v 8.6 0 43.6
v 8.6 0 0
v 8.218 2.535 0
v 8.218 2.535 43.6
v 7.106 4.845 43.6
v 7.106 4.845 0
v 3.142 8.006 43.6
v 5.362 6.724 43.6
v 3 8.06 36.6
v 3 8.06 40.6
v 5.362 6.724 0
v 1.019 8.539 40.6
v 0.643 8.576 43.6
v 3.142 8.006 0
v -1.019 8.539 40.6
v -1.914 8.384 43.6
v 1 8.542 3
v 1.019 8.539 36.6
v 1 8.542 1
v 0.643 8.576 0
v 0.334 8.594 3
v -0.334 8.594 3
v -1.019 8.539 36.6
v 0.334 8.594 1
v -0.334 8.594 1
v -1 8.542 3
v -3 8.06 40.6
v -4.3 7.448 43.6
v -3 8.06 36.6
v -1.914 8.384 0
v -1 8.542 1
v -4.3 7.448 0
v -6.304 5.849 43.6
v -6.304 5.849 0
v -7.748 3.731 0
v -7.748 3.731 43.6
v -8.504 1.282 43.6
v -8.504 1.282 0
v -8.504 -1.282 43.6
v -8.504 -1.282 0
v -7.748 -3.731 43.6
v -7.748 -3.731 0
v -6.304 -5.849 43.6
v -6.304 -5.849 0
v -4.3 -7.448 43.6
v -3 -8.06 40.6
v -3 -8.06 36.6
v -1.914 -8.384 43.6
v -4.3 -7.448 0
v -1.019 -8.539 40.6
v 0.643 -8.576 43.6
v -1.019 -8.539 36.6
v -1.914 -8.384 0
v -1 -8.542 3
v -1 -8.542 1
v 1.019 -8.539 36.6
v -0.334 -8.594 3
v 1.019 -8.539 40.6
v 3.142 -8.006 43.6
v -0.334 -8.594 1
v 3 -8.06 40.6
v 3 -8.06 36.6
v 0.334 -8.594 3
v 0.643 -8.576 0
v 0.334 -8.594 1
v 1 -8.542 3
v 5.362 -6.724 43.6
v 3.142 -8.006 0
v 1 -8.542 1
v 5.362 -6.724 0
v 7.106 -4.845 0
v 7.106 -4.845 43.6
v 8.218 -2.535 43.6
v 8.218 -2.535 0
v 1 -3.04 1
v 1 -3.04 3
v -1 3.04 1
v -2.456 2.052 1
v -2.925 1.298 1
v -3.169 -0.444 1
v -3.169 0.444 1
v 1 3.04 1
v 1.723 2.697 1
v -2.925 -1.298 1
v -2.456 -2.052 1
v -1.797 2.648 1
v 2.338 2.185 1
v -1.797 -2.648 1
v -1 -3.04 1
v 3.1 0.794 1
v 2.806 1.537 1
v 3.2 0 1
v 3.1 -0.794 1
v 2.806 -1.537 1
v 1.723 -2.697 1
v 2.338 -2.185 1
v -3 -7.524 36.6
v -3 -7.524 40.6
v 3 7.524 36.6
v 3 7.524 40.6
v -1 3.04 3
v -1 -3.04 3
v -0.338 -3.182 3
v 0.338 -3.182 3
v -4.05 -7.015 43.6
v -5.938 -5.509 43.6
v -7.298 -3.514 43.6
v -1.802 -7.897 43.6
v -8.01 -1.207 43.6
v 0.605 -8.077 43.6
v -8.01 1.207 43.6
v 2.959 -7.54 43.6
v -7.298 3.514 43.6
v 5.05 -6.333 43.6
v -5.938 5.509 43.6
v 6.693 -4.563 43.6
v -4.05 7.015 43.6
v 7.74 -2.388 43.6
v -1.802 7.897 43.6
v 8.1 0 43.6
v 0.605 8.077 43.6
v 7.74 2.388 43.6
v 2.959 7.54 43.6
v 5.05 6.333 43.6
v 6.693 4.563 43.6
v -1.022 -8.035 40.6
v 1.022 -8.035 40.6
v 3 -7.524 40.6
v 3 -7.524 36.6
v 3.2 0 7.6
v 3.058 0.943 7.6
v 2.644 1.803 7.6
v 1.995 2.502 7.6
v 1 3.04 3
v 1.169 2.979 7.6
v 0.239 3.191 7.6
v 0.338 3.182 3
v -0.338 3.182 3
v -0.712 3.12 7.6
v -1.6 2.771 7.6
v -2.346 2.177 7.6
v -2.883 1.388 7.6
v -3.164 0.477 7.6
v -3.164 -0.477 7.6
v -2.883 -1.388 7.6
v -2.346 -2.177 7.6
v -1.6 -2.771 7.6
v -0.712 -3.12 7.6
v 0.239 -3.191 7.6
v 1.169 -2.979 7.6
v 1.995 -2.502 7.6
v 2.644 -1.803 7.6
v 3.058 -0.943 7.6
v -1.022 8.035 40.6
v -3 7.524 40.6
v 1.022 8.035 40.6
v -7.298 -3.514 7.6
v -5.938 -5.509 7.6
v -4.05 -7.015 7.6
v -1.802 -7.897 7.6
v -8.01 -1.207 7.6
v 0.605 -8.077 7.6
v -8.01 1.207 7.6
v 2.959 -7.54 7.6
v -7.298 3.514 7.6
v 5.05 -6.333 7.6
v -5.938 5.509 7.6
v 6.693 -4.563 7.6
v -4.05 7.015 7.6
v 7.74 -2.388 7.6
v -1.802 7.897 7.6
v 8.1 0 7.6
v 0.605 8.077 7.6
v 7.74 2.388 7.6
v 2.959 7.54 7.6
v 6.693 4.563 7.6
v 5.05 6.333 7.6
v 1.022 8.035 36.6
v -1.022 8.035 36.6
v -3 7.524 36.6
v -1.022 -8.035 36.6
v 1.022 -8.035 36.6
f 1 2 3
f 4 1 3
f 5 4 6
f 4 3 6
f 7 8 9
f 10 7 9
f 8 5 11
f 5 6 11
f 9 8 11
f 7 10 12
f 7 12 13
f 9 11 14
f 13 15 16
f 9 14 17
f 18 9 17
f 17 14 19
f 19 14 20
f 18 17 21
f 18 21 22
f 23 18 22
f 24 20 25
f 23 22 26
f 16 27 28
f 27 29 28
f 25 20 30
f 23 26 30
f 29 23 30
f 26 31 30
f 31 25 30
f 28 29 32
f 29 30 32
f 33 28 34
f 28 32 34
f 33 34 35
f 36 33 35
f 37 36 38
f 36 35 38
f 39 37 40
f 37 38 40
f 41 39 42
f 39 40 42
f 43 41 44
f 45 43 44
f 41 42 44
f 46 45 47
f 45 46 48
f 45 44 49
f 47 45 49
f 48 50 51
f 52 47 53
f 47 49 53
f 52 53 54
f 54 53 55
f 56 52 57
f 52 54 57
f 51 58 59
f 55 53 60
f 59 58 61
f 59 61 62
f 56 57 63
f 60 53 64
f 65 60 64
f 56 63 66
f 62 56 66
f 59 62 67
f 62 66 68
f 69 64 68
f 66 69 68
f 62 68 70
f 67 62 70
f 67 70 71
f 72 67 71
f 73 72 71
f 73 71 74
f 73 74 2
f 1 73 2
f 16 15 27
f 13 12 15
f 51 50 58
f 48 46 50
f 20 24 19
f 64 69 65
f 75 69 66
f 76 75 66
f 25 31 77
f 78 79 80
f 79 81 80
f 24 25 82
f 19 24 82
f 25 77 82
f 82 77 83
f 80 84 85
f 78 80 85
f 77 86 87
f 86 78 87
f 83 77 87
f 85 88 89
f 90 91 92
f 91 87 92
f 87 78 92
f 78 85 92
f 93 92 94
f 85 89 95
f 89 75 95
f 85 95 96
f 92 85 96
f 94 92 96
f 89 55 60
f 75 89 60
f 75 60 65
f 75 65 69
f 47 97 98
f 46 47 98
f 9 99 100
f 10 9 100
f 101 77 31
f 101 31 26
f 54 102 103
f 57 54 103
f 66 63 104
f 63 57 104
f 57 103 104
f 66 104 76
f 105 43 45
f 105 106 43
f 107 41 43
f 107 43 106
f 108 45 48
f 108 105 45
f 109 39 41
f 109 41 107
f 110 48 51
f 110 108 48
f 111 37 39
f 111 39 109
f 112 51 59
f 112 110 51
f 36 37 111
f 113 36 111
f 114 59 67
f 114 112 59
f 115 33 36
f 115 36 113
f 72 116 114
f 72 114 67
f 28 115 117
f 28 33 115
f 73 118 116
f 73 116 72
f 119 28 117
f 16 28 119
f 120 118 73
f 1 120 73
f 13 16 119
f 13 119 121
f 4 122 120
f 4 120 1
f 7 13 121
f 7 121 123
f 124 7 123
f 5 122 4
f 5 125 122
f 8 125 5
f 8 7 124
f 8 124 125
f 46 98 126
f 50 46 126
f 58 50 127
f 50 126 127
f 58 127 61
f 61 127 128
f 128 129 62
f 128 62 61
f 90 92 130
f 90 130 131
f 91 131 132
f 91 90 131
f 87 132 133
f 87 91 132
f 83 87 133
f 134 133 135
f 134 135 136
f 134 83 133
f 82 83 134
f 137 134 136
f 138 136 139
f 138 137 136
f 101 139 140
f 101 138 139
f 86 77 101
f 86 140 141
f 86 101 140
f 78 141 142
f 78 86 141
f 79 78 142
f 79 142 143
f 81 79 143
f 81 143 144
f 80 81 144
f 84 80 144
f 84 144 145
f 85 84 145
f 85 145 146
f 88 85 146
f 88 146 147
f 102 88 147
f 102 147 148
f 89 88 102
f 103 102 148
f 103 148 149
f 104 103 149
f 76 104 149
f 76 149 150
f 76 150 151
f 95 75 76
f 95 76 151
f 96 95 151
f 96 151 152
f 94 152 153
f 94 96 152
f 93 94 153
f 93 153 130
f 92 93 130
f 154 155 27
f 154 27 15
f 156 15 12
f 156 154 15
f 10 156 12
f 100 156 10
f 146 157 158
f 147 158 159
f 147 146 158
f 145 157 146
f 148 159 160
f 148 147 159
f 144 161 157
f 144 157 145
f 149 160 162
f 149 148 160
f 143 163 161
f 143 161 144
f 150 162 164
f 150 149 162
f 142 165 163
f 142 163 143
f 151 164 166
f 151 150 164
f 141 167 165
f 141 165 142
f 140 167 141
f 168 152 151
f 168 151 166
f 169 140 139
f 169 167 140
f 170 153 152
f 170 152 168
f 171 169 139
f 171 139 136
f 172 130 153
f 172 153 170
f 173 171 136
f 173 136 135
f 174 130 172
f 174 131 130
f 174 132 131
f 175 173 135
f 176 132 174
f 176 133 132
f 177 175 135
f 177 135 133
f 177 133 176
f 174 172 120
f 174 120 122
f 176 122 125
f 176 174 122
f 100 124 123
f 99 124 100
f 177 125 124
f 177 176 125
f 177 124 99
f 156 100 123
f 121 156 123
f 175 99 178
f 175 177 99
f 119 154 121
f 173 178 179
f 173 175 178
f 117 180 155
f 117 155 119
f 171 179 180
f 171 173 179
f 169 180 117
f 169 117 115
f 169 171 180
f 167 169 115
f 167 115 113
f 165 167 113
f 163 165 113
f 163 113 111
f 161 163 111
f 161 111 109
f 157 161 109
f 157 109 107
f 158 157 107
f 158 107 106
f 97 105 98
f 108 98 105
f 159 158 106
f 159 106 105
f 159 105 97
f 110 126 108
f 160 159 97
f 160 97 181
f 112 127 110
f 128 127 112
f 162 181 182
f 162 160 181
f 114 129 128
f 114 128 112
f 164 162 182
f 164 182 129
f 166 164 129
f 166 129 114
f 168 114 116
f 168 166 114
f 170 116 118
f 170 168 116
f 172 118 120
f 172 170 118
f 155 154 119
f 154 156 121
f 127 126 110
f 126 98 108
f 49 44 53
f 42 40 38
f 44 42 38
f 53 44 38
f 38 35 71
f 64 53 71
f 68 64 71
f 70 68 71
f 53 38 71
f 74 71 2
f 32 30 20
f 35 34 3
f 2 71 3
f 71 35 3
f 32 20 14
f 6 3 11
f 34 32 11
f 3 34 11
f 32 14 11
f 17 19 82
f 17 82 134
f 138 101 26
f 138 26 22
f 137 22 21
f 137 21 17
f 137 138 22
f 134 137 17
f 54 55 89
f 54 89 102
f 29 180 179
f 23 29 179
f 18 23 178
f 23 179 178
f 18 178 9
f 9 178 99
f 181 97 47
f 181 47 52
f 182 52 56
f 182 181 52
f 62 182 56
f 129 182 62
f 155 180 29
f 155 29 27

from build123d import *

# Parameters (mm, degrees)
SKETCH_R             = 8.6
PAD_DEPTH            = 1
SKETCH001_R          = 8.6
SKETCH001_R_2        = 3.2
PAD001_DEPTH         = 6.6
SKETCH002_W          = 2
SKETCH002_H          = 2
POCKET_DEPTH         = 8.601
POCKET_DEPTH_BACK    = -8.601
SKETCH003_R          = 8.6
SKETCH003_R_2        = 8.1
PAD002_DEPTH         = 36
SKETCH004_W          = 6
SKETCH004_H          = 4
POCKET001_DEPTH      = 8.601
POCKET001_DEPTH_BACK = -8.601


with BuildPart() as part:
    # Sketch → Pad (new body)
    with BuildSketch(Plane.XY):
        Circle(SKETCH_R)
    extrude(amount=PAD_DEPTH)

    # Sketch001 (on Face3 of Pad) → Pad001 (join)
    with BuildSketch(Plane.XY.offset(1)):
        Circle(SKETCH001_R)
        Circle(SKETCH001_R_2, mode=Mode.SUBTRACT)
    extrude(amount=PAD001_DEPTH)

    # Sketch002 → Pocket (cut, two sides)
    with BuildSketch(Plane.XZ) as pocket_sk:
        with Locations((0, 2)):
            Rectangle(SKETCH002_W, SKETCH002_H)
    extrude(amount=-POCKET_DEPTH, mode=Mode.SUBTRACT)
    extrude(pocket_sk.sketch, amount=-POCKET_DEPTH_BACK, mode=Mode.SUBTRACT)

    # Sketch003 (on Face12 of Pocket) → Pad002 (join)
    with BuildSketch(Plane.XY.offset(7.6)):
        Circle(SKETCH003_R)
        Circle(SKETCH003_R_2, mode=Mode.SUBTRACT)
    extrude(amount=PAD002_DEPTH)

    # Sketch004 → Pocket001 (cut, two sides)
    with BuildSketch(Plane.XZ) as pocket001_sk:
        with Locations((0, 38.6)):
            Rectangle(SKETCH004_W, SKETCH004_H)
    extrude(amount=-POCKET001_DEPTH, mode=Mode.SUBTRACT)
    extrude(pocket001_sk.sketch, amount=-POCKET001_DEPTH_BACK, mode=Mode.SUBTRACT)


solid = part.part
